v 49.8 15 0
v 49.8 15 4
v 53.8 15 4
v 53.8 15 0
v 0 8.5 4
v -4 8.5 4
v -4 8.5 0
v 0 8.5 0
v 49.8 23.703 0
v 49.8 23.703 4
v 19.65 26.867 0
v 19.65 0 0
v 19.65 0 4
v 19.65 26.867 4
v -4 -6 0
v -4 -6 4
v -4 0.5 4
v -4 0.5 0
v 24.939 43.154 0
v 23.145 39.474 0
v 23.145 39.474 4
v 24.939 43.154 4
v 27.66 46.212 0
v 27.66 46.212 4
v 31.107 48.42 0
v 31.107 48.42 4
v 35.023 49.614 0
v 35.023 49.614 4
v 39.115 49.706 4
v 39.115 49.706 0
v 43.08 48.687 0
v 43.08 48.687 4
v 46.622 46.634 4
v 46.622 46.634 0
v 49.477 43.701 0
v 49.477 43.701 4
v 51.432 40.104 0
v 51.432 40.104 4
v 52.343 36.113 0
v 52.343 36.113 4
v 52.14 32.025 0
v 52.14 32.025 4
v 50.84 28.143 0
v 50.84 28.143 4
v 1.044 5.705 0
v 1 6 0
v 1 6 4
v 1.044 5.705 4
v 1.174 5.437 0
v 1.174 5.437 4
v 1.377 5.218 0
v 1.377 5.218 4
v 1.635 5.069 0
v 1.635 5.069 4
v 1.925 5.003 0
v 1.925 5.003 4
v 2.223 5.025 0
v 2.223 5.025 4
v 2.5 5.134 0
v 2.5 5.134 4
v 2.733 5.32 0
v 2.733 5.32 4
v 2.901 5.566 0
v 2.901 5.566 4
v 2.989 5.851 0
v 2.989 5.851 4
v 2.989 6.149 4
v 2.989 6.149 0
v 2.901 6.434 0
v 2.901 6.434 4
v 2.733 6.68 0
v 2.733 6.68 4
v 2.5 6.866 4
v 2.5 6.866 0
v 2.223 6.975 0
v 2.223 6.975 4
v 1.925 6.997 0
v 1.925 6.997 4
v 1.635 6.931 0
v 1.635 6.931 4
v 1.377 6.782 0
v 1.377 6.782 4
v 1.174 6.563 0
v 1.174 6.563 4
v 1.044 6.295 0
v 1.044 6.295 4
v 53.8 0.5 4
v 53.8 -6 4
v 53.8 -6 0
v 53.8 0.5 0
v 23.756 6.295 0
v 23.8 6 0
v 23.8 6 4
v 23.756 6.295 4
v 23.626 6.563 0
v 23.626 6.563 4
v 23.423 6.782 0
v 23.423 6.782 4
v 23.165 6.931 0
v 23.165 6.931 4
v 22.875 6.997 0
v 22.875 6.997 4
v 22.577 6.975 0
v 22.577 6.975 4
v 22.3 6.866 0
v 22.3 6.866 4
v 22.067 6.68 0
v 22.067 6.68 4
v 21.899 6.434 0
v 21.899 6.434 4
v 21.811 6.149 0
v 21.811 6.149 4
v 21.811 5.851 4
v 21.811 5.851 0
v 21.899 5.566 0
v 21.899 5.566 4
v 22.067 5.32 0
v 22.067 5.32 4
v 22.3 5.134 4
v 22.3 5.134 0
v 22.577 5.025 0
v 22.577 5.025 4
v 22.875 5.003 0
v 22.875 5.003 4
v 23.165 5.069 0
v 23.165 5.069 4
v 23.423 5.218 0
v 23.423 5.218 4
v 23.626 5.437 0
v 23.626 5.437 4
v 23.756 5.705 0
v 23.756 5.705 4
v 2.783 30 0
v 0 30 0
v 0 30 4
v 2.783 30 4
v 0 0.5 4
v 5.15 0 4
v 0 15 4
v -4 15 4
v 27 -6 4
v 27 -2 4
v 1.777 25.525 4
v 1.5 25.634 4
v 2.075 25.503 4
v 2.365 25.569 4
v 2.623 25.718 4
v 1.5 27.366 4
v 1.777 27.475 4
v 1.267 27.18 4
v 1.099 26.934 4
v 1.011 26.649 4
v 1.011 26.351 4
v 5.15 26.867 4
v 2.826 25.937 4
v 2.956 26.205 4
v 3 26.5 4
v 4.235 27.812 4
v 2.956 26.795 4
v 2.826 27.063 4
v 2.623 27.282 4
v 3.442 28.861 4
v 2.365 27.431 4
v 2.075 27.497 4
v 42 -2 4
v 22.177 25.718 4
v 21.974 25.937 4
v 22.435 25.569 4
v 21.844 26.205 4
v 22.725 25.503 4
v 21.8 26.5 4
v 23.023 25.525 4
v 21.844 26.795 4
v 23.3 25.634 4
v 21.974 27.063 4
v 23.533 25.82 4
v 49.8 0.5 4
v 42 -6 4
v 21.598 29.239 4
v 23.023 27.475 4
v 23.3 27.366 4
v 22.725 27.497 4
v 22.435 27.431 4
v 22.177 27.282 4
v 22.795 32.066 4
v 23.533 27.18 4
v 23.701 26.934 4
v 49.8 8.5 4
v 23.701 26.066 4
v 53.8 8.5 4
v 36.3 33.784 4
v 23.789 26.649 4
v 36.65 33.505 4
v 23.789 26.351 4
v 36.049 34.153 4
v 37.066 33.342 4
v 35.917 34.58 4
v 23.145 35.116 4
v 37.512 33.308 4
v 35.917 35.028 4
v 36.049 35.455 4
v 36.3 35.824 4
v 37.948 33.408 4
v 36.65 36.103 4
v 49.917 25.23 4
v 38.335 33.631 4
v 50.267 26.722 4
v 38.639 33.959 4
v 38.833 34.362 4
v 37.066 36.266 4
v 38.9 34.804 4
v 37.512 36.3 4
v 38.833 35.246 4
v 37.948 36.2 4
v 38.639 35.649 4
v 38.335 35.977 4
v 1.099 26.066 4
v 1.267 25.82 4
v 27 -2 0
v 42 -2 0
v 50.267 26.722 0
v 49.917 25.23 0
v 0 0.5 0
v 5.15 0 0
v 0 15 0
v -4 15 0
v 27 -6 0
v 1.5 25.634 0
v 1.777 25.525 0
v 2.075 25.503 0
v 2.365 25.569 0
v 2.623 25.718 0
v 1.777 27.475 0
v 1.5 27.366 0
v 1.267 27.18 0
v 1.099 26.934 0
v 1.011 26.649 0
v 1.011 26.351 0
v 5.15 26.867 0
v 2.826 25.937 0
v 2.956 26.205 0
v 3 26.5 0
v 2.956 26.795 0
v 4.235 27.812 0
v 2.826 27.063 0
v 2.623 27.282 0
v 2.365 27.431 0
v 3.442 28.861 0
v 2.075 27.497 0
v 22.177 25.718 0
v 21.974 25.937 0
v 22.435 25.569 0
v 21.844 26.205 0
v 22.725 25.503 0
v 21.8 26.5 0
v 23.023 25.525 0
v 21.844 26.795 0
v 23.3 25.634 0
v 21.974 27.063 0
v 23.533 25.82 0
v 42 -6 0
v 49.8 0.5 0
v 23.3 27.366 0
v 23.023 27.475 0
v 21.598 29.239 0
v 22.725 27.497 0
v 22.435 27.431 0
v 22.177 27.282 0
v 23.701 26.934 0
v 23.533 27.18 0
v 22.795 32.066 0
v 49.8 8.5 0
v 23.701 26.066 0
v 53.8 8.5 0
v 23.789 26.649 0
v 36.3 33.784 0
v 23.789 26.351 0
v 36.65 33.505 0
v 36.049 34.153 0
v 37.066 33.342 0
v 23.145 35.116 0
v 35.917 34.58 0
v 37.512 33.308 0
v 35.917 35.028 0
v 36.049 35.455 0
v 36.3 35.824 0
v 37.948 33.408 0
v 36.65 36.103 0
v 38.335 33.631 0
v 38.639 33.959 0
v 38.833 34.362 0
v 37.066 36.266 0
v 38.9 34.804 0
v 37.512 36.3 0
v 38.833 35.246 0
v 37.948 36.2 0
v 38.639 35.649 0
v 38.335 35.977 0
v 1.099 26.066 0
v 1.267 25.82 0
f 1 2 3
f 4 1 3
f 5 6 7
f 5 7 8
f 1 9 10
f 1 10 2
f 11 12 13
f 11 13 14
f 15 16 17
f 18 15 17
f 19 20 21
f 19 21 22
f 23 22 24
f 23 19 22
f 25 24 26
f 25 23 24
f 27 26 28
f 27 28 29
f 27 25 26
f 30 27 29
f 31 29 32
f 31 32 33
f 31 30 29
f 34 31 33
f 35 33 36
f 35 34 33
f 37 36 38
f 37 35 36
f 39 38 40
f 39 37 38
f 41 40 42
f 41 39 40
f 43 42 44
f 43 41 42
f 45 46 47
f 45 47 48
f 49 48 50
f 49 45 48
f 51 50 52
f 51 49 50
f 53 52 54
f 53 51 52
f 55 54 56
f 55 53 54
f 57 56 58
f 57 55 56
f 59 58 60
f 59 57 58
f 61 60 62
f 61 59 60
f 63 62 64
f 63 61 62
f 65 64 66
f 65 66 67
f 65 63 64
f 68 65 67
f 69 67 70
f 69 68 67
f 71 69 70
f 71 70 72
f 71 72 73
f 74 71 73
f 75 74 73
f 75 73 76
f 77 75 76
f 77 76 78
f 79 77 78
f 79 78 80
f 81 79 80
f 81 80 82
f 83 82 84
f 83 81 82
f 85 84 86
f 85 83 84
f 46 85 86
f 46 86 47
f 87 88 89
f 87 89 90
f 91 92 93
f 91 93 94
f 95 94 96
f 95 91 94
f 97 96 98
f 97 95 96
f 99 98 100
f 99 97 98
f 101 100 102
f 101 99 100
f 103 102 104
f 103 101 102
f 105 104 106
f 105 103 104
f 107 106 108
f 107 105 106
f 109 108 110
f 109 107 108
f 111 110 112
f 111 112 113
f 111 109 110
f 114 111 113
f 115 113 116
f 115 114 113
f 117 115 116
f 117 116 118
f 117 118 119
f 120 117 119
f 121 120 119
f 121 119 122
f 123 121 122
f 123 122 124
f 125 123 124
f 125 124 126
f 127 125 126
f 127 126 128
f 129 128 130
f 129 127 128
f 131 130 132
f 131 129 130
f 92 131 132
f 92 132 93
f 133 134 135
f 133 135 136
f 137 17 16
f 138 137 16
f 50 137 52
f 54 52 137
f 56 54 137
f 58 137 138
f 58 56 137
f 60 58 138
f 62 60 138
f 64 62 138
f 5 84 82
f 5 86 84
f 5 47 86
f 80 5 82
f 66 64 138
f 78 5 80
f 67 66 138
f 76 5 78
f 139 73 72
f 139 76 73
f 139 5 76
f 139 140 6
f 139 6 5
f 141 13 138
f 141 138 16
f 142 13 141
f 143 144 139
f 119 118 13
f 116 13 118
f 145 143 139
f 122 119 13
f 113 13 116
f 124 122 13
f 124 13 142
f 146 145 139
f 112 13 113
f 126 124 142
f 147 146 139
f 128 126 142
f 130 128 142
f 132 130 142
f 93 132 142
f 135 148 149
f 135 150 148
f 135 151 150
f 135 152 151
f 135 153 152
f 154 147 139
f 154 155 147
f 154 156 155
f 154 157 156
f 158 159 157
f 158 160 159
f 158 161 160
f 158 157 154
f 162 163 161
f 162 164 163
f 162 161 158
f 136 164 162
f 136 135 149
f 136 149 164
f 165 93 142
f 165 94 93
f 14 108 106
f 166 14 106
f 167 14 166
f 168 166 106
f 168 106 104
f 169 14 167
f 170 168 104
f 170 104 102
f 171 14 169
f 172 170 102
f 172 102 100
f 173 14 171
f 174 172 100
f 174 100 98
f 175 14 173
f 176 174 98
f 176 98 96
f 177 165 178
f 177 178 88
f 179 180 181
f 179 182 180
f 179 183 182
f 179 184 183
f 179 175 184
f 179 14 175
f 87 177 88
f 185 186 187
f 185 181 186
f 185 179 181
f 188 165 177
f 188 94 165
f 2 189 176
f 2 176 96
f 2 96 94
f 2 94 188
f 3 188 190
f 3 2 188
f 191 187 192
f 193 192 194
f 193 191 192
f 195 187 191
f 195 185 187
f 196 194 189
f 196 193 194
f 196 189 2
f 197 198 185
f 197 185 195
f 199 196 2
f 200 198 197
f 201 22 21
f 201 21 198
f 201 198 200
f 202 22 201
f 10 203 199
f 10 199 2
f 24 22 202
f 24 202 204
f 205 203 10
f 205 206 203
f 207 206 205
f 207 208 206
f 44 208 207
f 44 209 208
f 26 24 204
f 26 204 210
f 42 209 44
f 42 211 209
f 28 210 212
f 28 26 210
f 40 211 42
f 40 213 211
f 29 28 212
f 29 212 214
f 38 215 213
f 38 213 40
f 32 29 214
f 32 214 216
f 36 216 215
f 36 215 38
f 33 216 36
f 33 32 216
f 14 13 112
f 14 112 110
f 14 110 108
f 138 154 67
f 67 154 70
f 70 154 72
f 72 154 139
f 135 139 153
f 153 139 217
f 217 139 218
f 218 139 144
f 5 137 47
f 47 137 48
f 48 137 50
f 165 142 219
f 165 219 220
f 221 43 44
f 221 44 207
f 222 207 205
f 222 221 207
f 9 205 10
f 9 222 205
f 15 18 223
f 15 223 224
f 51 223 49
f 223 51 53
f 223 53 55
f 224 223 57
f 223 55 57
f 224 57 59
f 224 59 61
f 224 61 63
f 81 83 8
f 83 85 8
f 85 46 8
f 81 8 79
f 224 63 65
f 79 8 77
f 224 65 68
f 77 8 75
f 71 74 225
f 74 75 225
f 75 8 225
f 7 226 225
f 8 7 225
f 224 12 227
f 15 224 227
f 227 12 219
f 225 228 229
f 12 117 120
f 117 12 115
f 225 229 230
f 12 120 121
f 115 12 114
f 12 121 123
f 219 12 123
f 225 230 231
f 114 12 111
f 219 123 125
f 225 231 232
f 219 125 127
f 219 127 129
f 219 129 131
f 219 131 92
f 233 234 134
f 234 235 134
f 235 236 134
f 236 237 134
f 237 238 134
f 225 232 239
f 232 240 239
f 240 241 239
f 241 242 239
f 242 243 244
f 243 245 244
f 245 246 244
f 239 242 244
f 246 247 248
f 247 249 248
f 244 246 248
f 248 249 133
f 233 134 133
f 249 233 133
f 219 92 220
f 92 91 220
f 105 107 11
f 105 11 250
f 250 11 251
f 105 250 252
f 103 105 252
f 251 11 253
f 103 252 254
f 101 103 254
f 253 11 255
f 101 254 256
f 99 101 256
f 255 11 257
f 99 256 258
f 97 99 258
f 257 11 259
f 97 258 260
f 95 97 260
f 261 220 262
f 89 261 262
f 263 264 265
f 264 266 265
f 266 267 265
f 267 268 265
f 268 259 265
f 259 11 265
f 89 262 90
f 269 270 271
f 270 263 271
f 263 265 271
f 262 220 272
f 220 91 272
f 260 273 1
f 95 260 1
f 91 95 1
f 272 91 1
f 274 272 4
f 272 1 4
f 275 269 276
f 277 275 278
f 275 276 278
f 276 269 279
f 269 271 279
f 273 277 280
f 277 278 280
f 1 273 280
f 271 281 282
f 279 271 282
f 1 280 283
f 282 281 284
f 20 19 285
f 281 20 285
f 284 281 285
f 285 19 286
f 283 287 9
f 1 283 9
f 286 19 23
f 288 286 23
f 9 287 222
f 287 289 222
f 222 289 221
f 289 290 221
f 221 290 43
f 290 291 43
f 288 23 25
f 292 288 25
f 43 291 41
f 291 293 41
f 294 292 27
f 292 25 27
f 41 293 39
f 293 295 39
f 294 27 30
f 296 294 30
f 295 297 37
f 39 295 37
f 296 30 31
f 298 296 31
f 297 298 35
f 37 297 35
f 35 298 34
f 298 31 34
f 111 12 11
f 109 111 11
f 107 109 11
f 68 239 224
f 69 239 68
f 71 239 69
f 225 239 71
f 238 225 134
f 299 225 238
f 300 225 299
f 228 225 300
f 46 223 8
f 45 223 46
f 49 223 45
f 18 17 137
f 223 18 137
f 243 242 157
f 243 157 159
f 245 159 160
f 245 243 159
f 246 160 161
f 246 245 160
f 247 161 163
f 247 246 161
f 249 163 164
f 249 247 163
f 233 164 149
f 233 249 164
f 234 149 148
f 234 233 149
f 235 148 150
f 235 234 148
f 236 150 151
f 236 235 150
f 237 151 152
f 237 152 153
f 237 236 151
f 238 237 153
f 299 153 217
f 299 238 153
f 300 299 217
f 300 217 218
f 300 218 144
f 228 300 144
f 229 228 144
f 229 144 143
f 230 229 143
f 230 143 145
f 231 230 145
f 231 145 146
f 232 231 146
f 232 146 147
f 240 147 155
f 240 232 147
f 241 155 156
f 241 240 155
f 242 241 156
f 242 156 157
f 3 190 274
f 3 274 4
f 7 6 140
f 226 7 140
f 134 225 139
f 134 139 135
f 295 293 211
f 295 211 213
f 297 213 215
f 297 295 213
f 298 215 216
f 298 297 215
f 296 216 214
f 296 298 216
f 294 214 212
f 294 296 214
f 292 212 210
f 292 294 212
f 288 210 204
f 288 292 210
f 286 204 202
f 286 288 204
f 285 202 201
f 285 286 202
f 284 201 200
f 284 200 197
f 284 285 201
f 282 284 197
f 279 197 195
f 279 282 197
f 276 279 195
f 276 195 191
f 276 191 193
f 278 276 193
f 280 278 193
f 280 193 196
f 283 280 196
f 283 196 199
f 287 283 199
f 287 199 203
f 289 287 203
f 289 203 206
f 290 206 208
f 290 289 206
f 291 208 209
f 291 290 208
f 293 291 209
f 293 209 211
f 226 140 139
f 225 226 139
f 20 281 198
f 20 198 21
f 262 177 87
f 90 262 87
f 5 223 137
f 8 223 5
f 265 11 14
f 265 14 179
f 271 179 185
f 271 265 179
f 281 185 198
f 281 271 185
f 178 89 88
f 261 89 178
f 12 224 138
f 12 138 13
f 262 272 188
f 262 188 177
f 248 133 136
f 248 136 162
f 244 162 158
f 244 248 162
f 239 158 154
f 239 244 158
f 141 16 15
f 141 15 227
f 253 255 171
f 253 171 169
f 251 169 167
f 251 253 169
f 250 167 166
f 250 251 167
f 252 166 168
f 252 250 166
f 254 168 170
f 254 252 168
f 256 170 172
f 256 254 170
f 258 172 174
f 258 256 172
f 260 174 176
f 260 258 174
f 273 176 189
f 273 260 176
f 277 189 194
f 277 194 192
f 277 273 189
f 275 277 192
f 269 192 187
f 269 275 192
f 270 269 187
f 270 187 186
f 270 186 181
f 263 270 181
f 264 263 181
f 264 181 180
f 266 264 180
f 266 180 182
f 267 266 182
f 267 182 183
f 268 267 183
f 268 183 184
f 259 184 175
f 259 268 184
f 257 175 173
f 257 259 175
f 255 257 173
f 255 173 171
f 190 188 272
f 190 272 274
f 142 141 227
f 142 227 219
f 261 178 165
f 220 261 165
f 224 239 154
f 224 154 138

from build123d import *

# Parameters (mm, degrees)
SKETCH_1_R          = 1
SKETCH_1_R_2        = 1.5
EXTRUDE_1_DEPTH     = 4
SKETCH_2_W          = 15
SKETCH_2_H          = 4
CUT_EXTRUDE_1_DEPTH = 10
SKETCH_3_W          = 4
SKETCH_3_H          = 6.5
EXTRUDE_2_DEPTH     = 4


with BuildPart() as part:
    # Эскиз1 → Бобышка-Вытянуть1 (new body)
    with BuildSketch(Plane.XY):
        with BuildLine():
            Line((0, 0), (0, 30))
            Line((0, 30), (2.783140074, 30))
            ThreePointArc((2.783140074, 30), (3.822293637, 28.324390962), (5.15, 26.866755347))
            Line((5.15, 26.866755347), (5.15, 0))
            Line((5.15, 0), (19.65, 0))
            Line((19.65, 0), (19.65, 26.866755347))
            ThreePointArc((19.65, 26.866755347), (22.29801609, 30.609753984), (23.145479479, 35.115731548))
            Line((23.145479479, 35.115731548), (23.145479479, 39.473981947))
            ThreePointArc((23.145479479, 39.473981947), (43.080010933, 48.687001602), (50.84, 28.143198519))
            ThreePointArc((50.84, 28.143198519), (50.063470844, 25.983008862), (49.8, 23.702658011))
            Line((49.8, 23.702658011), (49.8, -6))
            Line((49.8, -6), (0, -6))
            Line((0, -6), (0, 0))
        make_face()
        with Locations((2, 26.5)):
            Circle(SKETCH_1_R, mode=Mode.SUBTRACT)
        with Locations(Location((22.8, 26.5, 0), (0, 0, 180))):
            Circle(SKETCH_1_R, mode=Mode.SUBTRACT)
        with Locations((22.8, 6)):
            Circle(SKETCH_1_R, mode=Mode.SUBTRACT)
        with Locations(Location((2, 6, 0), (0, 0, 180))):
            Circle(SKETCH_1_R, mode=Mode.SUBTRACT)
        with Locations((37.4, 34.80400928)):
            Circle(SKETCH_1_R_2, mode=Mode.SUBTRACT)
    extrude(amount=EXTRUDE_1_DEPTH)

    # Эскиз2 → Вырез-Вытянуть1 (cut)
    with BuildSketch(Plane.XY.offset(4)):
        with Locations((34.5, -4)):
            Rectangle(SKETCH_2_W, SKETCH_2_H)
    extrude(amount=-CUT_EXTRUDE_1_DEPTH, mode=Mode.SUBTRACT)

    # Эскиз3 → Бобышка-Вытянуть2 (add)
    with BuildSketch(Plane.XY.offset(4)):
        with Locations((-2, -2.75)):
            Rectangle(SKETCH_3_W, SKETCH_3_H)
        with Locations((-2, 11.75)):
            Rectangle(SKETCH_3_W, SKETCH_3_H)
        with Locations((51.8, 11.75)):
            Rectangle(SKETCH_3_W, SKETCH_3_H)
        with Locations((51.8, -2.75)):
            Rectangle(SKETCH_3_W, SKETCH_3_H)
    extrude(amount=-EXTRUDE_2_DEPTH)


solid = part.part
